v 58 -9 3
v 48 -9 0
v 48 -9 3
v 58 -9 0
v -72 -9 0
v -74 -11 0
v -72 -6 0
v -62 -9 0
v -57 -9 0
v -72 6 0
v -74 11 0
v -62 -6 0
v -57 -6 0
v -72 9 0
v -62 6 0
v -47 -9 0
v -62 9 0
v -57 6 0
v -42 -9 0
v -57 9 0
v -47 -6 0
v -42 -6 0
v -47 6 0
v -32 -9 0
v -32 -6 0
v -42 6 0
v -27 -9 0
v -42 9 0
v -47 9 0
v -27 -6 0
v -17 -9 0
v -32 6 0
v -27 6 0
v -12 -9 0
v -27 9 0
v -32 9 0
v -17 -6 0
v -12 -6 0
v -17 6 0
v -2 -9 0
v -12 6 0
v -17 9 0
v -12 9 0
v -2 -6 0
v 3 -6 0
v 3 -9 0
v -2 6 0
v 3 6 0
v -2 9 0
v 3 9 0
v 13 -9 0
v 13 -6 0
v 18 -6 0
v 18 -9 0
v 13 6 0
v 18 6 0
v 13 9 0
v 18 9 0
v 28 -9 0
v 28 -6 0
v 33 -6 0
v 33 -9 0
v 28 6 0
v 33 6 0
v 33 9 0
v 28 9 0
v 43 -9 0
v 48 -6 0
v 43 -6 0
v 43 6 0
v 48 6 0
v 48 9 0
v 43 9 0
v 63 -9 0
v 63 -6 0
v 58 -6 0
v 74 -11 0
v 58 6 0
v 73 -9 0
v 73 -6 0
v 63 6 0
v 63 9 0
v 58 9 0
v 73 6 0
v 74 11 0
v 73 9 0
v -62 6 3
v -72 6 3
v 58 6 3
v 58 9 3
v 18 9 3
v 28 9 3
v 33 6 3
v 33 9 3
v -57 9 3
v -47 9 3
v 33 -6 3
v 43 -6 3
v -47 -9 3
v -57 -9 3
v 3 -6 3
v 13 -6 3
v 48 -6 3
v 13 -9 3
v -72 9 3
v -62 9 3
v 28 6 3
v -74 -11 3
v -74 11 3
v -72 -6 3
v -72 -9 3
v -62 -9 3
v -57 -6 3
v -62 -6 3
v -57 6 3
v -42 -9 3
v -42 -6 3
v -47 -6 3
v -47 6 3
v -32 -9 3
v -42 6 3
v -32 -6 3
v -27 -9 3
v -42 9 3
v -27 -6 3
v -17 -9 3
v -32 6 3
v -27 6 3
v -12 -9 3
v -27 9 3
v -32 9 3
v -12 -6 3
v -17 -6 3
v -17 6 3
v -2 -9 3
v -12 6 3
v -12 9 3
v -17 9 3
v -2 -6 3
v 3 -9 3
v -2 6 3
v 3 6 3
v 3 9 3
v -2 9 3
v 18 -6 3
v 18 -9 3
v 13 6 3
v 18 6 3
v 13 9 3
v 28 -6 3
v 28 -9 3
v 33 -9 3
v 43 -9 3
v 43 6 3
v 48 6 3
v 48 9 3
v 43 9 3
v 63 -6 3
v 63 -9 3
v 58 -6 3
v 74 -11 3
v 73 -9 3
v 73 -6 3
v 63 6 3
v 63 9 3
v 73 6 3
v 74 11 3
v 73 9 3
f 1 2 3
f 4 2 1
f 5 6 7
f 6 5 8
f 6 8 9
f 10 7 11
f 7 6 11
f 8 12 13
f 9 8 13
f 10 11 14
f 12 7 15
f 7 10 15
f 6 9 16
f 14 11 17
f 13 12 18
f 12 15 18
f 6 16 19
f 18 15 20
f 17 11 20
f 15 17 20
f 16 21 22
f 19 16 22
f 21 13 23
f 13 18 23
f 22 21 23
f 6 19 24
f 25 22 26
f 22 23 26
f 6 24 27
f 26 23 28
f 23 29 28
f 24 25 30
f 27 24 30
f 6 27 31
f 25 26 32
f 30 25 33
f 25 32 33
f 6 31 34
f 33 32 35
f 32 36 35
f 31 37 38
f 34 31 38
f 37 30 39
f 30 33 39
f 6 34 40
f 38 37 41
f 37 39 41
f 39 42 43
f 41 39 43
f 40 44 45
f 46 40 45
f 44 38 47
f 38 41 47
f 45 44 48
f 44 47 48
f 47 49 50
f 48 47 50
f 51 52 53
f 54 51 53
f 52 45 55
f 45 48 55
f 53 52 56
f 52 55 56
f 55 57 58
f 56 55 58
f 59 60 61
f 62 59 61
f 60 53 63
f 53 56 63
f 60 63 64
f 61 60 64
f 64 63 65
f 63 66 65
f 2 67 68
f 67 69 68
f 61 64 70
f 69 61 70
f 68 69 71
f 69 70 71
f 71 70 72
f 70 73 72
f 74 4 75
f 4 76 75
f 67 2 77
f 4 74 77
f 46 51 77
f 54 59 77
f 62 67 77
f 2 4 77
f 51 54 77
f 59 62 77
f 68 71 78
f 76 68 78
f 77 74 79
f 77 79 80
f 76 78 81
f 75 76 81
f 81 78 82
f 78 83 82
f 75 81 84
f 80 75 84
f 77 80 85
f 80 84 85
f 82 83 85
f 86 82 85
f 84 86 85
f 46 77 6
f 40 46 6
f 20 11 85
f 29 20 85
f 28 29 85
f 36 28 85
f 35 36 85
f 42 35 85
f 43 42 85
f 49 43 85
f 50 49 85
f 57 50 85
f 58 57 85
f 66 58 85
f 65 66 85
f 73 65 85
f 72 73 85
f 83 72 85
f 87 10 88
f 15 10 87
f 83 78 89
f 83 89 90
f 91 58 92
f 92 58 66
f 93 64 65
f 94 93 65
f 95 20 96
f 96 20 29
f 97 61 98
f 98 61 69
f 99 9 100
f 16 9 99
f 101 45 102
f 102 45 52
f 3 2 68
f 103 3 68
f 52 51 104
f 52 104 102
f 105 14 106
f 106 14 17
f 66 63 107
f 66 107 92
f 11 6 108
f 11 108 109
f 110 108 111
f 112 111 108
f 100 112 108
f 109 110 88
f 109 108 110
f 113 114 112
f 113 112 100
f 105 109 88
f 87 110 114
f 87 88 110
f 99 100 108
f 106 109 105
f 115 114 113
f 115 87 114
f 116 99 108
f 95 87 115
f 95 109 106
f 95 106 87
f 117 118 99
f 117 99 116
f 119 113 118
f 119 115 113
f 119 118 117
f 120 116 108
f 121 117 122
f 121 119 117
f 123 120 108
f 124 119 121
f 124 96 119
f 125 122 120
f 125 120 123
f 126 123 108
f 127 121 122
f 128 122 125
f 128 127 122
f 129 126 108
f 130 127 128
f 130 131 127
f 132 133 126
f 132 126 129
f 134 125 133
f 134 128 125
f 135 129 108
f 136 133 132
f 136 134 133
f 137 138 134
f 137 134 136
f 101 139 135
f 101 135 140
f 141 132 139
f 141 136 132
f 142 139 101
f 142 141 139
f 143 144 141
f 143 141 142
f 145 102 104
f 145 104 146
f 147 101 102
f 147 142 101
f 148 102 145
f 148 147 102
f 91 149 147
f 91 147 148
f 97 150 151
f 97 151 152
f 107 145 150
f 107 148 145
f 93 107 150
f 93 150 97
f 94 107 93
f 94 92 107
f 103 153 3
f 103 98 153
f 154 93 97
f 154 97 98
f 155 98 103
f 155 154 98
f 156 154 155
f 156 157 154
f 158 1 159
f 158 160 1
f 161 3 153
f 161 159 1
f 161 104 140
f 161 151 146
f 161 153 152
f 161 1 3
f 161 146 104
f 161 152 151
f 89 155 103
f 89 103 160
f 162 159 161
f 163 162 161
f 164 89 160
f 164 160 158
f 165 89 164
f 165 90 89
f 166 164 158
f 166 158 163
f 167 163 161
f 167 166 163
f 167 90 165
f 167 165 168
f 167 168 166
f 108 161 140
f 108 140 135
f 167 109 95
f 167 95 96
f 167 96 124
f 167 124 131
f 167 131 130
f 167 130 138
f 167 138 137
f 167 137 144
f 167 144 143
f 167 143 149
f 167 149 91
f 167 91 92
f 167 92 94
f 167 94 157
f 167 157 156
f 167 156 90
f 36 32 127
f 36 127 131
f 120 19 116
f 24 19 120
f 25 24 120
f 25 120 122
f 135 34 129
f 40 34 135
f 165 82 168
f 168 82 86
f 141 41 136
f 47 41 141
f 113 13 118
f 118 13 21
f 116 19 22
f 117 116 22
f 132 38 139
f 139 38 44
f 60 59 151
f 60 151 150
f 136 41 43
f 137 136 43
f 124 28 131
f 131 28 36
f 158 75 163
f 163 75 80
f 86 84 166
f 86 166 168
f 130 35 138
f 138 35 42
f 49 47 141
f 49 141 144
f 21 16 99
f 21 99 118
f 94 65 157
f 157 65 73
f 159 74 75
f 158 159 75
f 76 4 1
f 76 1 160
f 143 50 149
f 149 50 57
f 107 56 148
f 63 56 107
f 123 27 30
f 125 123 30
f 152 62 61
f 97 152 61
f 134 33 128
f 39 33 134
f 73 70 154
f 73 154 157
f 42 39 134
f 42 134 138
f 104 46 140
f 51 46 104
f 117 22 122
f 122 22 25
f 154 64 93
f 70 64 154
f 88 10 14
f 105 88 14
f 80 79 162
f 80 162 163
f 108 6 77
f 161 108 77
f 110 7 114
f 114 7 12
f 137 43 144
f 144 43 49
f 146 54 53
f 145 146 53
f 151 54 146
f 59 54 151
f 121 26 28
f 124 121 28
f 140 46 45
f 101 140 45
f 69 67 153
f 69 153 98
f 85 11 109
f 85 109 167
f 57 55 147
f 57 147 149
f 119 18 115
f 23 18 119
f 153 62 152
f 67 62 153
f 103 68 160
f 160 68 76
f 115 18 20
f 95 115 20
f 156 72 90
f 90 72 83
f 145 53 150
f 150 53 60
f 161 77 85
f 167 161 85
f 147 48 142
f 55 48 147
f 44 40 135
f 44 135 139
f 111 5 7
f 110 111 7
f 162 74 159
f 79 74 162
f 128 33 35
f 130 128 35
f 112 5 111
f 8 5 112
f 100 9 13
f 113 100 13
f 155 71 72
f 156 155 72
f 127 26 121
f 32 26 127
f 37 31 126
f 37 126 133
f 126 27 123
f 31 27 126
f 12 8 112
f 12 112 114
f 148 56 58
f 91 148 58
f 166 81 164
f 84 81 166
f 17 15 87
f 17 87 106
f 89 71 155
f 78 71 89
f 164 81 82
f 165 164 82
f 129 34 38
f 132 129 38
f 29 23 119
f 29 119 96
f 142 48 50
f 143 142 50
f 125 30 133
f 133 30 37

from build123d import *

# Parameters (mm, degrees)
SKETCH_1_W      = 148
SKETCH_1_H      = 22
SKETCH_1_W_2    = 10
SKETCH_1_H_2    = 3
EXTRUDE_1_DEPTH = 3


with BuildPart() as part:
    # 草图1 → 凸台-拉伸1 (new body)
    with BuildSketch(Plane.XY):
        Rectangle(SKETCH_1_W, SKETCH_1_H)
        with Locations((-52, 7.5)):
            Rectangle(SKETCH_1_W_2, SKETCH_1_H_2, mode=Mode.SUBTRACT)
        with Locations((-67, 7.5)):
            Rectangle(SKETCH_1_W_2, SKETCH_1_H_2, mode=Mode.SUBTRACT)
        with Locations((-37, 7.5)):
            Rectangle(SKETCH_1_W_2, SKETCH_1_H_2, mode=Mode.SUBTRACT)
        with Locations((-22, 7.5)):
            Rectangle(SKETCH_1_W_2, SKETCH_1_H_2, mode=Mode.SUBTRACT)
        with Locations((-7, 7.5)):
            Rectangle(SKETCH_1_W_2, SKETCH_1_H_2, mode=Mode.SUBTRACT)
        with Locations((8, 7.5)):
            Rectangle(SKETCH_1_W_2, SKETCH_1_H_2, mode=Mode.SUBTRACT)
        with Locations((23, 7.5)):
            Rectangle(SKETCH_1_W_2, SKETCH_1_H_2, mode=Mode.SUBTRACT)
        with Locations((38, 7.5)):
            Rectangle(SKETCH_1_W_2, SKETCH_1_H_2, mode=Mode.SUBTRACT)
        with Locations((53, 7.5)):
            Rectangle(SKETCH_1_W_2, SKETCH_1_H_2, mode=Mode.SUBTRACT)
        with Locations((68, 7.5)):
            Rectangle(SKETCH_1_W_2, SKETCH_1_H_2, mode=Mode.SUBTRACT)
        with Locations((68, -7.5)):
            Rectangle(SKETCH_1_W_2, SKETCH_1_H_2, mode=Mode.SUBTRACT)
        with Locations((53, -7.5)):
            Rectangle(SKETCH_1_W_2, SKETCH_1_H_2, mode=Mode.SUBTRACT)
        with Locations((38, -7.5)):
            Rectangle(SKETCH_1_W_2, SKETCH_1_H_2, mode=Mode.SUBTRACT)
        with Locations((23, -7.5)):
            Rectangle(SKETCH_1_W_2, SKETCH_1_H_2, mode=Mode.SUBTRACT)
        with Locations((8, -7.5)):
            Rectangle(SKETCH_1_W_2, SKETCH_1_H_2, mode=Mode.SUBTRACT)
        with Locations((-7, -7.5)):
            Rectangle(SKETCH_1_W_2, SKETCH_1_H_2, mode=Mode.SUBTRACT)
        with Locations((-22, -7.5)):
            Rectangle(SKETCH_1_W_2, SKETCH_1_H_2, mode=Mode.SUBTRACT)
        with Locations((-37, -7.5)):
            Rectangle(SKETCH_1_W_2, SKETCH_1_H_2, mode=Mode.SUBTRACT)
        with Locations((-52, -7.5)):
            Rectangle(SKETCH_1_W_2, SKETCH_1_H_2, mode=Mode.SUBTRACT)
        with Locations((-67, -7.5)):
            Rectangle(SKETCH_1_W_2, SKETCH_1_H_2, mode=Mode.SUBTRACT)
    extrude(amount=EXTRUDE_1_DEPTH)


solid = part.part
